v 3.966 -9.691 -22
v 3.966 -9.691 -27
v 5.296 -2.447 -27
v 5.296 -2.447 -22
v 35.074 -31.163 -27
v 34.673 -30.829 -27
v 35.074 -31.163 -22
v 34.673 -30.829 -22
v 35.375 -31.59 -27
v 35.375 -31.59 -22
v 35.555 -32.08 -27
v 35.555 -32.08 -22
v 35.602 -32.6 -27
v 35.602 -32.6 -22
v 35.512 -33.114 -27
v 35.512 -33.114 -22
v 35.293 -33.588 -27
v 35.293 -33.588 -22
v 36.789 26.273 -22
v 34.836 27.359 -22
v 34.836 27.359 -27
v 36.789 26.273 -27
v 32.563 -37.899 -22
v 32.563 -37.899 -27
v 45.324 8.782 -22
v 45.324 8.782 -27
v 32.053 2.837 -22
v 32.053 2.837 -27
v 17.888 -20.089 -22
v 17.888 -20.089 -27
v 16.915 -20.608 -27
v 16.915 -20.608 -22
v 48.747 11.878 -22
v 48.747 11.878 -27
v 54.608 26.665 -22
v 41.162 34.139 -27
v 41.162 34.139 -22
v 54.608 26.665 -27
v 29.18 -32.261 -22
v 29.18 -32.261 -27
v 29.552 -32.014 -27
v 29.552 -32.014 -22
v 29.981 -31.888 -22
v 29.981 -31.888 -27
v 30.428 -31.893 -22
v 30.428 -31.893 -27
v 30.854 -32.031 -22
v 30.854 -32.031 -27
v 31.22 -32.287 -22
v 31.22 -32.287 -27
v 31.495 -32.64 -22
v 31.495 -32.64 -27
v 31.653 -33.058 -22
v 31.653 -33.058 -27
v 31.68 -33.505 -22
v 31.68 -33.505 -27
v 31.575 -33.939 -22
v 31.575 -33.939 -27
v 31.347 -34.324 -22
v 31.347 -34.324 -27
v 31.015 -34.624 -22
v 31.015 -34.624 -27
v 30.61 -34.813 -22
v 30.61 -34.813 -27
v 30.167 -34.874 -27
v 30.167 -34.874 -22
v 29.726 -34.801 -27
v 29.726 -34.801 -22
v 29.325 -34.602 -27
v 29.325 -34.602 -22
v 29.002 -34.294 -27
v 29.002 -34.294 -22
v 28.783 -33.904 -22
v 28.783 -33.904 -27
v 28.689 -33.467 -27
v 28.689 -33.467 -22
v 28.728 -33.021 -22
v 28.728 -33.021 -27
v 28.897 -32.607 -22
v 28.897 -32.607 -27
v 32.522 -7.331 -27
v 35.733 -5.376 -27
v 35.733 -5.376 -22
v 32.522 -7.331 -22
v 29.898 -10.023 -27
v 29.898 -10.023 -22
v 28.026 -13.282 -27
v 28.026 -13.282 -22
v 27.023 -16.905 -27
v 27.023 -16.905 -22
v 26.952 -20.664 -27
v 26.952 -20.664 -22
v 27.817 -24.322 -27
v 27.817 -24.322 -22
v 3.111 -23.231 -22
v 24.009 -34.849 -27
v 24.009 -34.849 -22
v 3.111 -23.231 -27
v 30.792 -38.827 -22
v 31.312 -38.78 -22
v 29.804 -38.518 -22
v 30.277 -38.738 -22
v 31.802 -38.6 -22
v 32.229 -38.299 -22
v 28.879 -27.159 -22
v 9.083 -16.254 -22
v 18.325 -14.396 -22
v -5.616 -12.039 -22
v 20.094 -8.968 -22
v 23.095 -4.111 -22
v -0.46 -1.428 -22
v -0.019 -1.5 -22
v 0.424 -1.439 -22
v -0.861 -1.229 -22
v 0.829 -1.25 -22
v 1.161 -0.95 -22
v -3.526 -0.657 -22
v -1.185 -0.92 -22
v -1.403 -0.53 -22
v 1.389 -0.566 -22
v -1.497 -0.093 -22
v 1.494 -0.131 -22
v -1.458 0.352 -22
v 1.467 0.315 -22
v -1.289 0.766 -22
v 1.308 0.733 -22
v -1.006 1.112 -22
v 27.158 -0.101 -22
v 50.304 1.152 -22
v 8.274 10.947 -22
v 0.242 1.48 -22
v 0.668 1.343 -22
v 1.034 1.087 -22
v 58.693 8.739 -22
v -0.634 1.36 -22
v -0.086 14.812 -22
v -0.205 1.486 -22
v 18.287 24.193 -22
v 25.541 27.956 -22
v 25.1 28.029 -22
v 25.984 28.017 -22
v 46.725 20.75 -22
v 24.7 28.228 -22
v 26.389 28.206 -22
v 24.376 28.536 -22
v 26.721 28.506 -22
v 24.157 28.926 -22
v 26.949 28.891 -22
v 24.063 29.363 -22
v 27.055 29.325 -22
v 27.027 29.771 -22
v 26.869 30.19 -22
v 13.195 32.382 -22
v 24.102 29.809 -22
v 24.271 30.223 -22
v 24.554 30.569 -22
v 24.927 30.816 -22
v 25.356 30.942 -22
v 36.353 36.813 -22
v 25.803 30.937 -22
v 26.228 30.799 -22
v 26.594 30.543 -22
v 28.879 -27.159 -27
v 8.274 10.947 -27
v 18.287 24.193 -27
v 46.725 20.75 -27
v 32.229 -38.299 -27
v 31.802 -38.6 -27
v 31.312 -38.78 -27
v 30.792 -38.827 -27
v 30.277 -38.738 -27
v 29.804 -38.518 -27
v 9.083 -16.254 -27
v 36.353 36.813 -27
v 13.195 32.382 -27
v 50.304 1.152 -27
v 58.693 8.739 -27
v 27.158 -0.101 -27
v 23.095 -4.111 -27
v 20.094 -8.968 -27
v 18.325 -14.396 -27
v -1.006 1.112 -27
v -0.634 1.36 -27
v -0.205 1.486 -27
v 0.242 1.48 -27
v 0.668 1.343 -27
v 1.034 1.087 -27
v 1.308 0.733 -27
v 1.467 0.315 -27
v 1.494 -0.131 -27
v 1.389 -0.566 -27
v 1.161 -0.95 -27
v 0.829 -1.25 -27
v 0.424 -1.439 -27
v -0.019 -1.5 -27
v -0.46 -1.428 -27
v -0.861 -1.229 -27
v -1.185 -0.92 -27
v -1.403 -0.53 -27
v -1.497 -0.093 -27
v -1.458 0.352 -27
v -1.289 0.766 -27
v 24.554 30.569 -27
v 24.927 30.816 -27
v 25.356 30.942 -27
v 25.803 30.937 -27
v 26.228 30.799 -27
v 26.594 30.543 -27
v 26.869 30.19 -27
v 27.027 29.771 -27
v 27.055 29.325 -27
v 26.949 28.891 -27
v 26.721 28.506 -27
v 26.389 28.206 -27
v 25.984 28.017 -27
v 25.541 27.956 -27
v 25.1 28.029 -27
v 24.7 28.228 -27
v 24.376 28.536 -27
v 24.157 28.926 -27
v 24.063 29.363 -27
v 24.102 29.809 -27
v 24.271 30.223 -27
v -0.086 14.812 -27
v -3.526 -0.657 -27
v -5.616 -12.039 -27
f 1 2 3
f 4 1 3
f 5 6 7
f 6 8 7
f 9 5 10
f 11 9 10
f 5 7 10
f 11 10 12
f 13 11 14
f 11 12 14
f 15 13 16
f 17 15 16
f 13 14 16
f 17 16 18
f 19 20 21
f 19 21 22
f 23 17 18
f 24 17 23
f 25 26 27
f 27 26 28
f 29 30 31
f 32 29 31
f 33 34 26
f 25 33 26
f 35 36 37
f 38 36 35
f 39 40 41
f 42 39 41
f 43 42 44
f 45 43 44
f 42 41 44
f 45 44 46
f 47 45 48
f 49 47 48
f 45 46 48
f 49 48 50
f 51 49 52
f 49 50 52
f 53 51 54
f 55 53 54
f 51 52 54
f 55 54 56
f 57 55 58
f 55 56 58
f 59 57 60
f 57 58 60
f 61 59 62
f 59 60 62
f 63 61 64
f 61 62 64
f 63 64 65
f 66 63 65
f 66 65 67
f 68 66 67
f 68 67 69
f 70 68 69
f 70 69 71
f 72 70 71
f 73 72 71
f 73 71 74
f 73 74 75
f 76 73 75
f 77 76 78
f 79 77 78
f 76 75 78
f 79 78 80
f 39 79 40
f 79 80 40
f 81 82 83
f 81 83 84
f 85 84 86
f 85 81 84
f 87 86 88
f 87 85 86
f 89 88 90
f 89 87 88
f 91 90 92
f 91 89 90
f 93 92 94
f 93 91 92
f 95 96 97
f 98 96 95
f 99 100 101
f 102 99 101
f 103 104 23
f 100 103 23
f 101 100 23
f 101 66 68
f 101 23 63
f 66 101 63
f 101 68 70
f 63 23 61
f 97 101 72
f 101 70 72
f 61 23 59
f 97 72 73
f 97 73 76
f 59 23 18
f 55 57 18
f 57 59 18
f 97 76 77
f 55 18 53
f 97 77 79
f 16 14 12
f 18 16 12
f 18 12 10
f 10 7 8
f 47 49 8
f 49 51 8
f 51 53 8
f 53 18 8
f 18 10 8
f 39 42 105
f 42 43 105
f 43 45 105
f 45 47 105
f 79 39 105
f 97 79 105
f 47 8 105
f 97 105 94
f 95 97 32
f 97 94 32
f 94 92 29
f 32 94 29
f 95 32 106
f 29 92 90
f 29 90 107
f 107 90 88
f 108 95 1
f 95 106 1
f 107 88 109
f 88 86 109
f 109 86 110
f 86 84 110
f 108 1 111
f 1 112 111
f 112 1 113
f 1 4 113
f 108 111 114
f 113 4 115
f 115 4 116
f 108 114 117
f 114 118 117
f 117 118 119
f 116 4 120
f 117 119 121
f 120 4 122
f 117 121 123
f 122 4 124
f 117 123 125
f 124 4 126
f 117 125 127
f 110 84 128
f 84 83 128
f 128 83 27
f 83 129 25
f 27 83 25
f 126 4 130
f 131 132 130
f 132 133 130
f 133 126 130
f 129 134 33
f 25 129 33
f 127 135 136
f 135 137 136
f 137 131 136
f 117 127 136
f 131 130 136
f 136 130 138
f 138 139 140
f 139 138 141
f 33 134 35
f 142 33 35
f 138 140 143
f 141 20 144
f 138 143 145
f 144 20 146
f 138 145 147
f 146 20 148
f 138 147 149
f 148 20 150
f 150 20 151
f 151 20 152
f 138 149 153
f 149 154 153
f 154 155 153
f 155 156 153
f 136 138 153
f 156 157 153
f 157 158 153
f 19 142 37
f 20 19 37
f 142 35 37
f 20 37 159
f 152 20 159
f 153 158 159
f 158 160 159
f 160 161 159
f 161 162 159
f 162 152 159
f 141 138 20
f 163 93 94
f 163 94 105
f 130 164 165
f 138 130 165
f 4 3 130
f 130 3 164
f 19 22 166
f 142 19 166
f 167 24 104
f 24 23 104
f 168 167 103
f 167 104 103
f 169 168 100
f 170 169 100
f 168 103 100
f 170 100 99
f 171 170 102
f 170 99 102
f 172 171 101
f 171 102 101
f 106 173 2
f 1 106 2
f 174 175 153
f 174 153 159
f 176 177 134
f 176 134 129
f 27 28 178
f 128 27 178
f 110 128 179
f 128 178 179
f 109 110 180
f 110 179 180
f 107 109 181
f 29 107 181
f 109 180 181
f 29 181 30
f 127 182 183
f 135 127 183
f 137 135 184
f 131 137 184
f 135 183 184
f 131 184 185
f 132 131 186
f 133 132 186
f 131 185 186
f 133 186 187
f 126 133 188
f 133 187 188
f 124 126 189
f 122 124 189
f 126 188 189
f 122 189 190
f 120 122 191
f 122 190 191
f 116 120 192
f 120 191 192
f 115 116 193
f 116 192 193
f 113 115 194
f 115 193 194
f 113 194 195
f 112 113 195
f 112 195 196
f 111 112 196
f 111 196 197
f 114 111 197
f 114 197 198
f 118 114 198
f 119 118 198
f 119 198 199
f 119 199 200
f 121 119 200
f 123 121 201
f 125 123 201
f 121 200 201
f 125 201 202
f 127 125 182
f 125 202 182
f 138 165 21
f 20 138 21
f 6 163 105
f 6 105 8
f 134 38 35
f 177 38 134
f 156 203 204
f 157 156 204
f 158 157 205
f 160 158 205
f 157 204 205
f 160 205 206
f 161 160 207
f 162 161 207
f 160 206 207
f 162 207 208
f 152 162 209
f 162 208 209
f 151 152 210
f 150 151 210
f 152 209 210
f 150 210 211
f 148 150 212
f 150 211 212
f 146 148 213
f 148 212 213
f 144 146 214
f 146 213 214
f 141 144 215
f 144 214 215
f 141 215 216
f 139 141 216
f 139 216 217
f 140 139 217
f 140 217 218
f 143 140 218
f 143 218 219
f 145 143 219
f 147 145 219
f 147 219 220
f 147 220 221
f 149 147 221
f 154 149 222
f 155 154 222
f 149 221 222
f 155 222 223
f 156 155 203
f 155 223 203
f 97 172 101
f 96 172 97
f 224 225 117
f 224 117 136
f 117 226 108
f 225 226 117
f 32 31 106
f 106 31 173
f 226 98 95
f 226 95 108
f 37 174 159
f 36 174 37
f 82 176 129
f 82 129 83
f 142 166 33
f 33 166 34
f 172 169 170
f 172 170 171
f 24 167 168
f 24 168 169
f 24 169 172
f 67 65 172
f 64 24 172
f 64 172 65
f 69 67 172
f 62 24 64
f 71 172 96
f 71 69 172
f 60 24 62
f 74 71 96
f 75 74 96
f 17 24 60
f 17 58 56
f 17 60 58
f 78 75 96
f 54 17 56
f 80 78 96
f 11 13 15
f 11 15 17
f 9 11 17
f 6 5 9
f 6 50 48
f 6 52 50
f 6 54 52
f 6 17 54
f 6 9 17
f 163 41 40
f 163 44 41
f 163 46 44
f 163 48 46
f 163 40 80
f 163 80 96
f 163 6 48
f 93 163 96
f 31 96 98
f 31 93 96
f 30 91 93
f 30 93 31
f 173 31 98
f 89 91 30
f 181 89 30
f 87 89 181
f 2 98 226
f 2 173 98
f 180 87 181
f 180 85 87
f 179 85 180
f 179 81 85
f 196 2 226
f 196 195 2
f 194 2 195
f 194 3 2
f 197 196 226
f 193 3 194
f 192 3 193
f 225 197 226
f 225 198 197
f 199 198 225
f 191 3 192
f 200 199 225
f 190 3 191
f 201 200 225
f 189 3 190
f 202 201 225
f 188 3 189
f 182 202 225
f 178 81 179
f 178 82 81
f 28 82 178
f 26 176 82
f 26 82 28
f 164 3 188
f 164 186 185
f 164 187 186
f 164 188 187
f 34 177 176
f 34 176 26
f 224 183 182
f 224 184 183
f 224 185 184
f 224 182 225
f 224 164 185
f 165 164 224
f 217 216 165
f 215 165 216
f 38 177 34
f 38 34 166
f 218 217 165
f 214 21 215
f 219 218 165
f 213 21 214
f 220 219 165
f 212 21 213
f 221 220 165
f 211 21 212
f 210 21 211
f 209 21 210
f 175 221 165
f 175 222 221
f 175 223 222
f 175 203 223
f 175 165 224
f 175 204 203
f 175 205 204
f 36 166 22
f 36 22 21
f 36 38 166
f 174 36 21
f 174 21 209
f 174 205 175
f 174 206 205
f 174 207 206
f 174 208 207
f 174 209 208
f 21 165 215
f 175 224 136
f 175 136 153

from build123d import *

# Parameters (mm, degrees)
SKETCH2_R           = 1.5
BOSS_EXTRUDE1_DEPTH = 5
FILLET1_R           = 2


with BuildPart() as part:
    # Sketch2 → Boss-Extrude1 (new body)
    with BuildSketch(Plane(origin=(6.301928067, 33.341579781, -27), x_dir=(-0.670801619, 0.74163683, 0), z_dir=(0, 0, -1))):
        with BuildLine():
            Line((-60.01425581, -23.839998272), (-68.549452032, -21.468875235))
            Line((-68.549452032, -21.468875235), (-70.98574419, -30.238657023))
            Line((-70.98574419, -30.238657023), (-62.450547968, -32.60978006))
            Line((-62.450547968, -32.60978006), (-39.815769516, -40.315756269))
            Line((-39.815769516, -40.315756269), (-25.661547731, -39.280246834))
            Line((-25.661547731, -39.280246834), (-18.621605657, -30.094798604))
            Line((-18.621605657, -30.094798604), (-9.456704001, -17.167000829))
            Line((-9.456704001, -17.167000829), (-5.335690467, 4.468320227))
            Line((-5.335690467, 4.468320227), (-17.584258472, 24.615497506))
            Line((-17.584258472, 24.615497506), (-22.792310688, 26.388571034))
            Line((-22.792310688, 26.388571034), (-37.355145596, 31.346466229))
            Line((-37.355145596, 31.346466229), (-53.38998859, 22.351505712))
            Line((-53.38998859, 22.351505712), (-53.38998859, 11.040844476))
            Line((-53.38998859, 11.040844476), (-48.457282179, -4.144818068))
            ThreePointArc((-48.457282179, -4.144818068), (-49.150509534, -15.1642744), (-57.197834388, -22.724006186))
            Line((-57.197834388, -22.724006186), (-60.01425581, -23.839998272))
        make_face()
        with Locations((-65.5, -27.039327647)):
            Circle(SKETCH2_R, mode=Mode.SUBTRACT)
        with Locations((-20.5, -27.039327647)):
            Circle(SKETCH2_R, mode=Mode.SUBTRACT)
        with Locations((-15.8, 11.676431418)):
            Circle(SKETCH2_R, mode=Mode.SUBTRACT)
        with BuildLine():
            Line((-47.130315082, -28.318253081), (-38.647453771, -31.206230429))
            Line((-38.647453771, -31.206230429), (-30.347341702, -30.599002106))
            Line((-30.347341702, -30.599002106), (-25.866841879, -24.753016622))
            Line((-25.866841879, -24.753016622), (-17.931352522, -13.559399331))
            Line((-17.931352522, -13.559399331), (-14.824551002, 2.751308649))
            Line((-14.824551002, 2.751308649), (-23.577444554, 17.1485915))
            Line((-23.577444554, 17.1485915), (-25.692860174, 17.86878156))
            Line((-25.692860174, 17.86878156), (-36.454250771, 21.532480769))
            Line((-36.454250771, 21.532480769), (-44.38998859, 17.080822067))
            Line((-44.38998859, 17.080822067), (-44.38998859, 12.465915799))
            Line((-44.38998859, 12.465915799), (-39.897539246, -1.364386282))
            ThreePointArc((-39.897539246, -1.364386282), (-39.671812155, -15.458597607), (-47.39803378, -27.248561347))
            Line((-47.39803378, -27.248561347), (-47.130315082, -28.318253081))
        make_face(mode=Mode.SUBTRACT)
    extrude(amount=-BOSS_EXTRUDE1_DEPTH)

    # Fillet1
    fillet1_edges = [part.edges().sort_by_distance(p)[0] for p in [
        (31.493178432, -39.588202626, -24.5),
        (36.362902877, -31.898574812, -24.5),
    ]]
    fillet(fillet1_edges, radius=FILLET1_R)


solid = part.part
